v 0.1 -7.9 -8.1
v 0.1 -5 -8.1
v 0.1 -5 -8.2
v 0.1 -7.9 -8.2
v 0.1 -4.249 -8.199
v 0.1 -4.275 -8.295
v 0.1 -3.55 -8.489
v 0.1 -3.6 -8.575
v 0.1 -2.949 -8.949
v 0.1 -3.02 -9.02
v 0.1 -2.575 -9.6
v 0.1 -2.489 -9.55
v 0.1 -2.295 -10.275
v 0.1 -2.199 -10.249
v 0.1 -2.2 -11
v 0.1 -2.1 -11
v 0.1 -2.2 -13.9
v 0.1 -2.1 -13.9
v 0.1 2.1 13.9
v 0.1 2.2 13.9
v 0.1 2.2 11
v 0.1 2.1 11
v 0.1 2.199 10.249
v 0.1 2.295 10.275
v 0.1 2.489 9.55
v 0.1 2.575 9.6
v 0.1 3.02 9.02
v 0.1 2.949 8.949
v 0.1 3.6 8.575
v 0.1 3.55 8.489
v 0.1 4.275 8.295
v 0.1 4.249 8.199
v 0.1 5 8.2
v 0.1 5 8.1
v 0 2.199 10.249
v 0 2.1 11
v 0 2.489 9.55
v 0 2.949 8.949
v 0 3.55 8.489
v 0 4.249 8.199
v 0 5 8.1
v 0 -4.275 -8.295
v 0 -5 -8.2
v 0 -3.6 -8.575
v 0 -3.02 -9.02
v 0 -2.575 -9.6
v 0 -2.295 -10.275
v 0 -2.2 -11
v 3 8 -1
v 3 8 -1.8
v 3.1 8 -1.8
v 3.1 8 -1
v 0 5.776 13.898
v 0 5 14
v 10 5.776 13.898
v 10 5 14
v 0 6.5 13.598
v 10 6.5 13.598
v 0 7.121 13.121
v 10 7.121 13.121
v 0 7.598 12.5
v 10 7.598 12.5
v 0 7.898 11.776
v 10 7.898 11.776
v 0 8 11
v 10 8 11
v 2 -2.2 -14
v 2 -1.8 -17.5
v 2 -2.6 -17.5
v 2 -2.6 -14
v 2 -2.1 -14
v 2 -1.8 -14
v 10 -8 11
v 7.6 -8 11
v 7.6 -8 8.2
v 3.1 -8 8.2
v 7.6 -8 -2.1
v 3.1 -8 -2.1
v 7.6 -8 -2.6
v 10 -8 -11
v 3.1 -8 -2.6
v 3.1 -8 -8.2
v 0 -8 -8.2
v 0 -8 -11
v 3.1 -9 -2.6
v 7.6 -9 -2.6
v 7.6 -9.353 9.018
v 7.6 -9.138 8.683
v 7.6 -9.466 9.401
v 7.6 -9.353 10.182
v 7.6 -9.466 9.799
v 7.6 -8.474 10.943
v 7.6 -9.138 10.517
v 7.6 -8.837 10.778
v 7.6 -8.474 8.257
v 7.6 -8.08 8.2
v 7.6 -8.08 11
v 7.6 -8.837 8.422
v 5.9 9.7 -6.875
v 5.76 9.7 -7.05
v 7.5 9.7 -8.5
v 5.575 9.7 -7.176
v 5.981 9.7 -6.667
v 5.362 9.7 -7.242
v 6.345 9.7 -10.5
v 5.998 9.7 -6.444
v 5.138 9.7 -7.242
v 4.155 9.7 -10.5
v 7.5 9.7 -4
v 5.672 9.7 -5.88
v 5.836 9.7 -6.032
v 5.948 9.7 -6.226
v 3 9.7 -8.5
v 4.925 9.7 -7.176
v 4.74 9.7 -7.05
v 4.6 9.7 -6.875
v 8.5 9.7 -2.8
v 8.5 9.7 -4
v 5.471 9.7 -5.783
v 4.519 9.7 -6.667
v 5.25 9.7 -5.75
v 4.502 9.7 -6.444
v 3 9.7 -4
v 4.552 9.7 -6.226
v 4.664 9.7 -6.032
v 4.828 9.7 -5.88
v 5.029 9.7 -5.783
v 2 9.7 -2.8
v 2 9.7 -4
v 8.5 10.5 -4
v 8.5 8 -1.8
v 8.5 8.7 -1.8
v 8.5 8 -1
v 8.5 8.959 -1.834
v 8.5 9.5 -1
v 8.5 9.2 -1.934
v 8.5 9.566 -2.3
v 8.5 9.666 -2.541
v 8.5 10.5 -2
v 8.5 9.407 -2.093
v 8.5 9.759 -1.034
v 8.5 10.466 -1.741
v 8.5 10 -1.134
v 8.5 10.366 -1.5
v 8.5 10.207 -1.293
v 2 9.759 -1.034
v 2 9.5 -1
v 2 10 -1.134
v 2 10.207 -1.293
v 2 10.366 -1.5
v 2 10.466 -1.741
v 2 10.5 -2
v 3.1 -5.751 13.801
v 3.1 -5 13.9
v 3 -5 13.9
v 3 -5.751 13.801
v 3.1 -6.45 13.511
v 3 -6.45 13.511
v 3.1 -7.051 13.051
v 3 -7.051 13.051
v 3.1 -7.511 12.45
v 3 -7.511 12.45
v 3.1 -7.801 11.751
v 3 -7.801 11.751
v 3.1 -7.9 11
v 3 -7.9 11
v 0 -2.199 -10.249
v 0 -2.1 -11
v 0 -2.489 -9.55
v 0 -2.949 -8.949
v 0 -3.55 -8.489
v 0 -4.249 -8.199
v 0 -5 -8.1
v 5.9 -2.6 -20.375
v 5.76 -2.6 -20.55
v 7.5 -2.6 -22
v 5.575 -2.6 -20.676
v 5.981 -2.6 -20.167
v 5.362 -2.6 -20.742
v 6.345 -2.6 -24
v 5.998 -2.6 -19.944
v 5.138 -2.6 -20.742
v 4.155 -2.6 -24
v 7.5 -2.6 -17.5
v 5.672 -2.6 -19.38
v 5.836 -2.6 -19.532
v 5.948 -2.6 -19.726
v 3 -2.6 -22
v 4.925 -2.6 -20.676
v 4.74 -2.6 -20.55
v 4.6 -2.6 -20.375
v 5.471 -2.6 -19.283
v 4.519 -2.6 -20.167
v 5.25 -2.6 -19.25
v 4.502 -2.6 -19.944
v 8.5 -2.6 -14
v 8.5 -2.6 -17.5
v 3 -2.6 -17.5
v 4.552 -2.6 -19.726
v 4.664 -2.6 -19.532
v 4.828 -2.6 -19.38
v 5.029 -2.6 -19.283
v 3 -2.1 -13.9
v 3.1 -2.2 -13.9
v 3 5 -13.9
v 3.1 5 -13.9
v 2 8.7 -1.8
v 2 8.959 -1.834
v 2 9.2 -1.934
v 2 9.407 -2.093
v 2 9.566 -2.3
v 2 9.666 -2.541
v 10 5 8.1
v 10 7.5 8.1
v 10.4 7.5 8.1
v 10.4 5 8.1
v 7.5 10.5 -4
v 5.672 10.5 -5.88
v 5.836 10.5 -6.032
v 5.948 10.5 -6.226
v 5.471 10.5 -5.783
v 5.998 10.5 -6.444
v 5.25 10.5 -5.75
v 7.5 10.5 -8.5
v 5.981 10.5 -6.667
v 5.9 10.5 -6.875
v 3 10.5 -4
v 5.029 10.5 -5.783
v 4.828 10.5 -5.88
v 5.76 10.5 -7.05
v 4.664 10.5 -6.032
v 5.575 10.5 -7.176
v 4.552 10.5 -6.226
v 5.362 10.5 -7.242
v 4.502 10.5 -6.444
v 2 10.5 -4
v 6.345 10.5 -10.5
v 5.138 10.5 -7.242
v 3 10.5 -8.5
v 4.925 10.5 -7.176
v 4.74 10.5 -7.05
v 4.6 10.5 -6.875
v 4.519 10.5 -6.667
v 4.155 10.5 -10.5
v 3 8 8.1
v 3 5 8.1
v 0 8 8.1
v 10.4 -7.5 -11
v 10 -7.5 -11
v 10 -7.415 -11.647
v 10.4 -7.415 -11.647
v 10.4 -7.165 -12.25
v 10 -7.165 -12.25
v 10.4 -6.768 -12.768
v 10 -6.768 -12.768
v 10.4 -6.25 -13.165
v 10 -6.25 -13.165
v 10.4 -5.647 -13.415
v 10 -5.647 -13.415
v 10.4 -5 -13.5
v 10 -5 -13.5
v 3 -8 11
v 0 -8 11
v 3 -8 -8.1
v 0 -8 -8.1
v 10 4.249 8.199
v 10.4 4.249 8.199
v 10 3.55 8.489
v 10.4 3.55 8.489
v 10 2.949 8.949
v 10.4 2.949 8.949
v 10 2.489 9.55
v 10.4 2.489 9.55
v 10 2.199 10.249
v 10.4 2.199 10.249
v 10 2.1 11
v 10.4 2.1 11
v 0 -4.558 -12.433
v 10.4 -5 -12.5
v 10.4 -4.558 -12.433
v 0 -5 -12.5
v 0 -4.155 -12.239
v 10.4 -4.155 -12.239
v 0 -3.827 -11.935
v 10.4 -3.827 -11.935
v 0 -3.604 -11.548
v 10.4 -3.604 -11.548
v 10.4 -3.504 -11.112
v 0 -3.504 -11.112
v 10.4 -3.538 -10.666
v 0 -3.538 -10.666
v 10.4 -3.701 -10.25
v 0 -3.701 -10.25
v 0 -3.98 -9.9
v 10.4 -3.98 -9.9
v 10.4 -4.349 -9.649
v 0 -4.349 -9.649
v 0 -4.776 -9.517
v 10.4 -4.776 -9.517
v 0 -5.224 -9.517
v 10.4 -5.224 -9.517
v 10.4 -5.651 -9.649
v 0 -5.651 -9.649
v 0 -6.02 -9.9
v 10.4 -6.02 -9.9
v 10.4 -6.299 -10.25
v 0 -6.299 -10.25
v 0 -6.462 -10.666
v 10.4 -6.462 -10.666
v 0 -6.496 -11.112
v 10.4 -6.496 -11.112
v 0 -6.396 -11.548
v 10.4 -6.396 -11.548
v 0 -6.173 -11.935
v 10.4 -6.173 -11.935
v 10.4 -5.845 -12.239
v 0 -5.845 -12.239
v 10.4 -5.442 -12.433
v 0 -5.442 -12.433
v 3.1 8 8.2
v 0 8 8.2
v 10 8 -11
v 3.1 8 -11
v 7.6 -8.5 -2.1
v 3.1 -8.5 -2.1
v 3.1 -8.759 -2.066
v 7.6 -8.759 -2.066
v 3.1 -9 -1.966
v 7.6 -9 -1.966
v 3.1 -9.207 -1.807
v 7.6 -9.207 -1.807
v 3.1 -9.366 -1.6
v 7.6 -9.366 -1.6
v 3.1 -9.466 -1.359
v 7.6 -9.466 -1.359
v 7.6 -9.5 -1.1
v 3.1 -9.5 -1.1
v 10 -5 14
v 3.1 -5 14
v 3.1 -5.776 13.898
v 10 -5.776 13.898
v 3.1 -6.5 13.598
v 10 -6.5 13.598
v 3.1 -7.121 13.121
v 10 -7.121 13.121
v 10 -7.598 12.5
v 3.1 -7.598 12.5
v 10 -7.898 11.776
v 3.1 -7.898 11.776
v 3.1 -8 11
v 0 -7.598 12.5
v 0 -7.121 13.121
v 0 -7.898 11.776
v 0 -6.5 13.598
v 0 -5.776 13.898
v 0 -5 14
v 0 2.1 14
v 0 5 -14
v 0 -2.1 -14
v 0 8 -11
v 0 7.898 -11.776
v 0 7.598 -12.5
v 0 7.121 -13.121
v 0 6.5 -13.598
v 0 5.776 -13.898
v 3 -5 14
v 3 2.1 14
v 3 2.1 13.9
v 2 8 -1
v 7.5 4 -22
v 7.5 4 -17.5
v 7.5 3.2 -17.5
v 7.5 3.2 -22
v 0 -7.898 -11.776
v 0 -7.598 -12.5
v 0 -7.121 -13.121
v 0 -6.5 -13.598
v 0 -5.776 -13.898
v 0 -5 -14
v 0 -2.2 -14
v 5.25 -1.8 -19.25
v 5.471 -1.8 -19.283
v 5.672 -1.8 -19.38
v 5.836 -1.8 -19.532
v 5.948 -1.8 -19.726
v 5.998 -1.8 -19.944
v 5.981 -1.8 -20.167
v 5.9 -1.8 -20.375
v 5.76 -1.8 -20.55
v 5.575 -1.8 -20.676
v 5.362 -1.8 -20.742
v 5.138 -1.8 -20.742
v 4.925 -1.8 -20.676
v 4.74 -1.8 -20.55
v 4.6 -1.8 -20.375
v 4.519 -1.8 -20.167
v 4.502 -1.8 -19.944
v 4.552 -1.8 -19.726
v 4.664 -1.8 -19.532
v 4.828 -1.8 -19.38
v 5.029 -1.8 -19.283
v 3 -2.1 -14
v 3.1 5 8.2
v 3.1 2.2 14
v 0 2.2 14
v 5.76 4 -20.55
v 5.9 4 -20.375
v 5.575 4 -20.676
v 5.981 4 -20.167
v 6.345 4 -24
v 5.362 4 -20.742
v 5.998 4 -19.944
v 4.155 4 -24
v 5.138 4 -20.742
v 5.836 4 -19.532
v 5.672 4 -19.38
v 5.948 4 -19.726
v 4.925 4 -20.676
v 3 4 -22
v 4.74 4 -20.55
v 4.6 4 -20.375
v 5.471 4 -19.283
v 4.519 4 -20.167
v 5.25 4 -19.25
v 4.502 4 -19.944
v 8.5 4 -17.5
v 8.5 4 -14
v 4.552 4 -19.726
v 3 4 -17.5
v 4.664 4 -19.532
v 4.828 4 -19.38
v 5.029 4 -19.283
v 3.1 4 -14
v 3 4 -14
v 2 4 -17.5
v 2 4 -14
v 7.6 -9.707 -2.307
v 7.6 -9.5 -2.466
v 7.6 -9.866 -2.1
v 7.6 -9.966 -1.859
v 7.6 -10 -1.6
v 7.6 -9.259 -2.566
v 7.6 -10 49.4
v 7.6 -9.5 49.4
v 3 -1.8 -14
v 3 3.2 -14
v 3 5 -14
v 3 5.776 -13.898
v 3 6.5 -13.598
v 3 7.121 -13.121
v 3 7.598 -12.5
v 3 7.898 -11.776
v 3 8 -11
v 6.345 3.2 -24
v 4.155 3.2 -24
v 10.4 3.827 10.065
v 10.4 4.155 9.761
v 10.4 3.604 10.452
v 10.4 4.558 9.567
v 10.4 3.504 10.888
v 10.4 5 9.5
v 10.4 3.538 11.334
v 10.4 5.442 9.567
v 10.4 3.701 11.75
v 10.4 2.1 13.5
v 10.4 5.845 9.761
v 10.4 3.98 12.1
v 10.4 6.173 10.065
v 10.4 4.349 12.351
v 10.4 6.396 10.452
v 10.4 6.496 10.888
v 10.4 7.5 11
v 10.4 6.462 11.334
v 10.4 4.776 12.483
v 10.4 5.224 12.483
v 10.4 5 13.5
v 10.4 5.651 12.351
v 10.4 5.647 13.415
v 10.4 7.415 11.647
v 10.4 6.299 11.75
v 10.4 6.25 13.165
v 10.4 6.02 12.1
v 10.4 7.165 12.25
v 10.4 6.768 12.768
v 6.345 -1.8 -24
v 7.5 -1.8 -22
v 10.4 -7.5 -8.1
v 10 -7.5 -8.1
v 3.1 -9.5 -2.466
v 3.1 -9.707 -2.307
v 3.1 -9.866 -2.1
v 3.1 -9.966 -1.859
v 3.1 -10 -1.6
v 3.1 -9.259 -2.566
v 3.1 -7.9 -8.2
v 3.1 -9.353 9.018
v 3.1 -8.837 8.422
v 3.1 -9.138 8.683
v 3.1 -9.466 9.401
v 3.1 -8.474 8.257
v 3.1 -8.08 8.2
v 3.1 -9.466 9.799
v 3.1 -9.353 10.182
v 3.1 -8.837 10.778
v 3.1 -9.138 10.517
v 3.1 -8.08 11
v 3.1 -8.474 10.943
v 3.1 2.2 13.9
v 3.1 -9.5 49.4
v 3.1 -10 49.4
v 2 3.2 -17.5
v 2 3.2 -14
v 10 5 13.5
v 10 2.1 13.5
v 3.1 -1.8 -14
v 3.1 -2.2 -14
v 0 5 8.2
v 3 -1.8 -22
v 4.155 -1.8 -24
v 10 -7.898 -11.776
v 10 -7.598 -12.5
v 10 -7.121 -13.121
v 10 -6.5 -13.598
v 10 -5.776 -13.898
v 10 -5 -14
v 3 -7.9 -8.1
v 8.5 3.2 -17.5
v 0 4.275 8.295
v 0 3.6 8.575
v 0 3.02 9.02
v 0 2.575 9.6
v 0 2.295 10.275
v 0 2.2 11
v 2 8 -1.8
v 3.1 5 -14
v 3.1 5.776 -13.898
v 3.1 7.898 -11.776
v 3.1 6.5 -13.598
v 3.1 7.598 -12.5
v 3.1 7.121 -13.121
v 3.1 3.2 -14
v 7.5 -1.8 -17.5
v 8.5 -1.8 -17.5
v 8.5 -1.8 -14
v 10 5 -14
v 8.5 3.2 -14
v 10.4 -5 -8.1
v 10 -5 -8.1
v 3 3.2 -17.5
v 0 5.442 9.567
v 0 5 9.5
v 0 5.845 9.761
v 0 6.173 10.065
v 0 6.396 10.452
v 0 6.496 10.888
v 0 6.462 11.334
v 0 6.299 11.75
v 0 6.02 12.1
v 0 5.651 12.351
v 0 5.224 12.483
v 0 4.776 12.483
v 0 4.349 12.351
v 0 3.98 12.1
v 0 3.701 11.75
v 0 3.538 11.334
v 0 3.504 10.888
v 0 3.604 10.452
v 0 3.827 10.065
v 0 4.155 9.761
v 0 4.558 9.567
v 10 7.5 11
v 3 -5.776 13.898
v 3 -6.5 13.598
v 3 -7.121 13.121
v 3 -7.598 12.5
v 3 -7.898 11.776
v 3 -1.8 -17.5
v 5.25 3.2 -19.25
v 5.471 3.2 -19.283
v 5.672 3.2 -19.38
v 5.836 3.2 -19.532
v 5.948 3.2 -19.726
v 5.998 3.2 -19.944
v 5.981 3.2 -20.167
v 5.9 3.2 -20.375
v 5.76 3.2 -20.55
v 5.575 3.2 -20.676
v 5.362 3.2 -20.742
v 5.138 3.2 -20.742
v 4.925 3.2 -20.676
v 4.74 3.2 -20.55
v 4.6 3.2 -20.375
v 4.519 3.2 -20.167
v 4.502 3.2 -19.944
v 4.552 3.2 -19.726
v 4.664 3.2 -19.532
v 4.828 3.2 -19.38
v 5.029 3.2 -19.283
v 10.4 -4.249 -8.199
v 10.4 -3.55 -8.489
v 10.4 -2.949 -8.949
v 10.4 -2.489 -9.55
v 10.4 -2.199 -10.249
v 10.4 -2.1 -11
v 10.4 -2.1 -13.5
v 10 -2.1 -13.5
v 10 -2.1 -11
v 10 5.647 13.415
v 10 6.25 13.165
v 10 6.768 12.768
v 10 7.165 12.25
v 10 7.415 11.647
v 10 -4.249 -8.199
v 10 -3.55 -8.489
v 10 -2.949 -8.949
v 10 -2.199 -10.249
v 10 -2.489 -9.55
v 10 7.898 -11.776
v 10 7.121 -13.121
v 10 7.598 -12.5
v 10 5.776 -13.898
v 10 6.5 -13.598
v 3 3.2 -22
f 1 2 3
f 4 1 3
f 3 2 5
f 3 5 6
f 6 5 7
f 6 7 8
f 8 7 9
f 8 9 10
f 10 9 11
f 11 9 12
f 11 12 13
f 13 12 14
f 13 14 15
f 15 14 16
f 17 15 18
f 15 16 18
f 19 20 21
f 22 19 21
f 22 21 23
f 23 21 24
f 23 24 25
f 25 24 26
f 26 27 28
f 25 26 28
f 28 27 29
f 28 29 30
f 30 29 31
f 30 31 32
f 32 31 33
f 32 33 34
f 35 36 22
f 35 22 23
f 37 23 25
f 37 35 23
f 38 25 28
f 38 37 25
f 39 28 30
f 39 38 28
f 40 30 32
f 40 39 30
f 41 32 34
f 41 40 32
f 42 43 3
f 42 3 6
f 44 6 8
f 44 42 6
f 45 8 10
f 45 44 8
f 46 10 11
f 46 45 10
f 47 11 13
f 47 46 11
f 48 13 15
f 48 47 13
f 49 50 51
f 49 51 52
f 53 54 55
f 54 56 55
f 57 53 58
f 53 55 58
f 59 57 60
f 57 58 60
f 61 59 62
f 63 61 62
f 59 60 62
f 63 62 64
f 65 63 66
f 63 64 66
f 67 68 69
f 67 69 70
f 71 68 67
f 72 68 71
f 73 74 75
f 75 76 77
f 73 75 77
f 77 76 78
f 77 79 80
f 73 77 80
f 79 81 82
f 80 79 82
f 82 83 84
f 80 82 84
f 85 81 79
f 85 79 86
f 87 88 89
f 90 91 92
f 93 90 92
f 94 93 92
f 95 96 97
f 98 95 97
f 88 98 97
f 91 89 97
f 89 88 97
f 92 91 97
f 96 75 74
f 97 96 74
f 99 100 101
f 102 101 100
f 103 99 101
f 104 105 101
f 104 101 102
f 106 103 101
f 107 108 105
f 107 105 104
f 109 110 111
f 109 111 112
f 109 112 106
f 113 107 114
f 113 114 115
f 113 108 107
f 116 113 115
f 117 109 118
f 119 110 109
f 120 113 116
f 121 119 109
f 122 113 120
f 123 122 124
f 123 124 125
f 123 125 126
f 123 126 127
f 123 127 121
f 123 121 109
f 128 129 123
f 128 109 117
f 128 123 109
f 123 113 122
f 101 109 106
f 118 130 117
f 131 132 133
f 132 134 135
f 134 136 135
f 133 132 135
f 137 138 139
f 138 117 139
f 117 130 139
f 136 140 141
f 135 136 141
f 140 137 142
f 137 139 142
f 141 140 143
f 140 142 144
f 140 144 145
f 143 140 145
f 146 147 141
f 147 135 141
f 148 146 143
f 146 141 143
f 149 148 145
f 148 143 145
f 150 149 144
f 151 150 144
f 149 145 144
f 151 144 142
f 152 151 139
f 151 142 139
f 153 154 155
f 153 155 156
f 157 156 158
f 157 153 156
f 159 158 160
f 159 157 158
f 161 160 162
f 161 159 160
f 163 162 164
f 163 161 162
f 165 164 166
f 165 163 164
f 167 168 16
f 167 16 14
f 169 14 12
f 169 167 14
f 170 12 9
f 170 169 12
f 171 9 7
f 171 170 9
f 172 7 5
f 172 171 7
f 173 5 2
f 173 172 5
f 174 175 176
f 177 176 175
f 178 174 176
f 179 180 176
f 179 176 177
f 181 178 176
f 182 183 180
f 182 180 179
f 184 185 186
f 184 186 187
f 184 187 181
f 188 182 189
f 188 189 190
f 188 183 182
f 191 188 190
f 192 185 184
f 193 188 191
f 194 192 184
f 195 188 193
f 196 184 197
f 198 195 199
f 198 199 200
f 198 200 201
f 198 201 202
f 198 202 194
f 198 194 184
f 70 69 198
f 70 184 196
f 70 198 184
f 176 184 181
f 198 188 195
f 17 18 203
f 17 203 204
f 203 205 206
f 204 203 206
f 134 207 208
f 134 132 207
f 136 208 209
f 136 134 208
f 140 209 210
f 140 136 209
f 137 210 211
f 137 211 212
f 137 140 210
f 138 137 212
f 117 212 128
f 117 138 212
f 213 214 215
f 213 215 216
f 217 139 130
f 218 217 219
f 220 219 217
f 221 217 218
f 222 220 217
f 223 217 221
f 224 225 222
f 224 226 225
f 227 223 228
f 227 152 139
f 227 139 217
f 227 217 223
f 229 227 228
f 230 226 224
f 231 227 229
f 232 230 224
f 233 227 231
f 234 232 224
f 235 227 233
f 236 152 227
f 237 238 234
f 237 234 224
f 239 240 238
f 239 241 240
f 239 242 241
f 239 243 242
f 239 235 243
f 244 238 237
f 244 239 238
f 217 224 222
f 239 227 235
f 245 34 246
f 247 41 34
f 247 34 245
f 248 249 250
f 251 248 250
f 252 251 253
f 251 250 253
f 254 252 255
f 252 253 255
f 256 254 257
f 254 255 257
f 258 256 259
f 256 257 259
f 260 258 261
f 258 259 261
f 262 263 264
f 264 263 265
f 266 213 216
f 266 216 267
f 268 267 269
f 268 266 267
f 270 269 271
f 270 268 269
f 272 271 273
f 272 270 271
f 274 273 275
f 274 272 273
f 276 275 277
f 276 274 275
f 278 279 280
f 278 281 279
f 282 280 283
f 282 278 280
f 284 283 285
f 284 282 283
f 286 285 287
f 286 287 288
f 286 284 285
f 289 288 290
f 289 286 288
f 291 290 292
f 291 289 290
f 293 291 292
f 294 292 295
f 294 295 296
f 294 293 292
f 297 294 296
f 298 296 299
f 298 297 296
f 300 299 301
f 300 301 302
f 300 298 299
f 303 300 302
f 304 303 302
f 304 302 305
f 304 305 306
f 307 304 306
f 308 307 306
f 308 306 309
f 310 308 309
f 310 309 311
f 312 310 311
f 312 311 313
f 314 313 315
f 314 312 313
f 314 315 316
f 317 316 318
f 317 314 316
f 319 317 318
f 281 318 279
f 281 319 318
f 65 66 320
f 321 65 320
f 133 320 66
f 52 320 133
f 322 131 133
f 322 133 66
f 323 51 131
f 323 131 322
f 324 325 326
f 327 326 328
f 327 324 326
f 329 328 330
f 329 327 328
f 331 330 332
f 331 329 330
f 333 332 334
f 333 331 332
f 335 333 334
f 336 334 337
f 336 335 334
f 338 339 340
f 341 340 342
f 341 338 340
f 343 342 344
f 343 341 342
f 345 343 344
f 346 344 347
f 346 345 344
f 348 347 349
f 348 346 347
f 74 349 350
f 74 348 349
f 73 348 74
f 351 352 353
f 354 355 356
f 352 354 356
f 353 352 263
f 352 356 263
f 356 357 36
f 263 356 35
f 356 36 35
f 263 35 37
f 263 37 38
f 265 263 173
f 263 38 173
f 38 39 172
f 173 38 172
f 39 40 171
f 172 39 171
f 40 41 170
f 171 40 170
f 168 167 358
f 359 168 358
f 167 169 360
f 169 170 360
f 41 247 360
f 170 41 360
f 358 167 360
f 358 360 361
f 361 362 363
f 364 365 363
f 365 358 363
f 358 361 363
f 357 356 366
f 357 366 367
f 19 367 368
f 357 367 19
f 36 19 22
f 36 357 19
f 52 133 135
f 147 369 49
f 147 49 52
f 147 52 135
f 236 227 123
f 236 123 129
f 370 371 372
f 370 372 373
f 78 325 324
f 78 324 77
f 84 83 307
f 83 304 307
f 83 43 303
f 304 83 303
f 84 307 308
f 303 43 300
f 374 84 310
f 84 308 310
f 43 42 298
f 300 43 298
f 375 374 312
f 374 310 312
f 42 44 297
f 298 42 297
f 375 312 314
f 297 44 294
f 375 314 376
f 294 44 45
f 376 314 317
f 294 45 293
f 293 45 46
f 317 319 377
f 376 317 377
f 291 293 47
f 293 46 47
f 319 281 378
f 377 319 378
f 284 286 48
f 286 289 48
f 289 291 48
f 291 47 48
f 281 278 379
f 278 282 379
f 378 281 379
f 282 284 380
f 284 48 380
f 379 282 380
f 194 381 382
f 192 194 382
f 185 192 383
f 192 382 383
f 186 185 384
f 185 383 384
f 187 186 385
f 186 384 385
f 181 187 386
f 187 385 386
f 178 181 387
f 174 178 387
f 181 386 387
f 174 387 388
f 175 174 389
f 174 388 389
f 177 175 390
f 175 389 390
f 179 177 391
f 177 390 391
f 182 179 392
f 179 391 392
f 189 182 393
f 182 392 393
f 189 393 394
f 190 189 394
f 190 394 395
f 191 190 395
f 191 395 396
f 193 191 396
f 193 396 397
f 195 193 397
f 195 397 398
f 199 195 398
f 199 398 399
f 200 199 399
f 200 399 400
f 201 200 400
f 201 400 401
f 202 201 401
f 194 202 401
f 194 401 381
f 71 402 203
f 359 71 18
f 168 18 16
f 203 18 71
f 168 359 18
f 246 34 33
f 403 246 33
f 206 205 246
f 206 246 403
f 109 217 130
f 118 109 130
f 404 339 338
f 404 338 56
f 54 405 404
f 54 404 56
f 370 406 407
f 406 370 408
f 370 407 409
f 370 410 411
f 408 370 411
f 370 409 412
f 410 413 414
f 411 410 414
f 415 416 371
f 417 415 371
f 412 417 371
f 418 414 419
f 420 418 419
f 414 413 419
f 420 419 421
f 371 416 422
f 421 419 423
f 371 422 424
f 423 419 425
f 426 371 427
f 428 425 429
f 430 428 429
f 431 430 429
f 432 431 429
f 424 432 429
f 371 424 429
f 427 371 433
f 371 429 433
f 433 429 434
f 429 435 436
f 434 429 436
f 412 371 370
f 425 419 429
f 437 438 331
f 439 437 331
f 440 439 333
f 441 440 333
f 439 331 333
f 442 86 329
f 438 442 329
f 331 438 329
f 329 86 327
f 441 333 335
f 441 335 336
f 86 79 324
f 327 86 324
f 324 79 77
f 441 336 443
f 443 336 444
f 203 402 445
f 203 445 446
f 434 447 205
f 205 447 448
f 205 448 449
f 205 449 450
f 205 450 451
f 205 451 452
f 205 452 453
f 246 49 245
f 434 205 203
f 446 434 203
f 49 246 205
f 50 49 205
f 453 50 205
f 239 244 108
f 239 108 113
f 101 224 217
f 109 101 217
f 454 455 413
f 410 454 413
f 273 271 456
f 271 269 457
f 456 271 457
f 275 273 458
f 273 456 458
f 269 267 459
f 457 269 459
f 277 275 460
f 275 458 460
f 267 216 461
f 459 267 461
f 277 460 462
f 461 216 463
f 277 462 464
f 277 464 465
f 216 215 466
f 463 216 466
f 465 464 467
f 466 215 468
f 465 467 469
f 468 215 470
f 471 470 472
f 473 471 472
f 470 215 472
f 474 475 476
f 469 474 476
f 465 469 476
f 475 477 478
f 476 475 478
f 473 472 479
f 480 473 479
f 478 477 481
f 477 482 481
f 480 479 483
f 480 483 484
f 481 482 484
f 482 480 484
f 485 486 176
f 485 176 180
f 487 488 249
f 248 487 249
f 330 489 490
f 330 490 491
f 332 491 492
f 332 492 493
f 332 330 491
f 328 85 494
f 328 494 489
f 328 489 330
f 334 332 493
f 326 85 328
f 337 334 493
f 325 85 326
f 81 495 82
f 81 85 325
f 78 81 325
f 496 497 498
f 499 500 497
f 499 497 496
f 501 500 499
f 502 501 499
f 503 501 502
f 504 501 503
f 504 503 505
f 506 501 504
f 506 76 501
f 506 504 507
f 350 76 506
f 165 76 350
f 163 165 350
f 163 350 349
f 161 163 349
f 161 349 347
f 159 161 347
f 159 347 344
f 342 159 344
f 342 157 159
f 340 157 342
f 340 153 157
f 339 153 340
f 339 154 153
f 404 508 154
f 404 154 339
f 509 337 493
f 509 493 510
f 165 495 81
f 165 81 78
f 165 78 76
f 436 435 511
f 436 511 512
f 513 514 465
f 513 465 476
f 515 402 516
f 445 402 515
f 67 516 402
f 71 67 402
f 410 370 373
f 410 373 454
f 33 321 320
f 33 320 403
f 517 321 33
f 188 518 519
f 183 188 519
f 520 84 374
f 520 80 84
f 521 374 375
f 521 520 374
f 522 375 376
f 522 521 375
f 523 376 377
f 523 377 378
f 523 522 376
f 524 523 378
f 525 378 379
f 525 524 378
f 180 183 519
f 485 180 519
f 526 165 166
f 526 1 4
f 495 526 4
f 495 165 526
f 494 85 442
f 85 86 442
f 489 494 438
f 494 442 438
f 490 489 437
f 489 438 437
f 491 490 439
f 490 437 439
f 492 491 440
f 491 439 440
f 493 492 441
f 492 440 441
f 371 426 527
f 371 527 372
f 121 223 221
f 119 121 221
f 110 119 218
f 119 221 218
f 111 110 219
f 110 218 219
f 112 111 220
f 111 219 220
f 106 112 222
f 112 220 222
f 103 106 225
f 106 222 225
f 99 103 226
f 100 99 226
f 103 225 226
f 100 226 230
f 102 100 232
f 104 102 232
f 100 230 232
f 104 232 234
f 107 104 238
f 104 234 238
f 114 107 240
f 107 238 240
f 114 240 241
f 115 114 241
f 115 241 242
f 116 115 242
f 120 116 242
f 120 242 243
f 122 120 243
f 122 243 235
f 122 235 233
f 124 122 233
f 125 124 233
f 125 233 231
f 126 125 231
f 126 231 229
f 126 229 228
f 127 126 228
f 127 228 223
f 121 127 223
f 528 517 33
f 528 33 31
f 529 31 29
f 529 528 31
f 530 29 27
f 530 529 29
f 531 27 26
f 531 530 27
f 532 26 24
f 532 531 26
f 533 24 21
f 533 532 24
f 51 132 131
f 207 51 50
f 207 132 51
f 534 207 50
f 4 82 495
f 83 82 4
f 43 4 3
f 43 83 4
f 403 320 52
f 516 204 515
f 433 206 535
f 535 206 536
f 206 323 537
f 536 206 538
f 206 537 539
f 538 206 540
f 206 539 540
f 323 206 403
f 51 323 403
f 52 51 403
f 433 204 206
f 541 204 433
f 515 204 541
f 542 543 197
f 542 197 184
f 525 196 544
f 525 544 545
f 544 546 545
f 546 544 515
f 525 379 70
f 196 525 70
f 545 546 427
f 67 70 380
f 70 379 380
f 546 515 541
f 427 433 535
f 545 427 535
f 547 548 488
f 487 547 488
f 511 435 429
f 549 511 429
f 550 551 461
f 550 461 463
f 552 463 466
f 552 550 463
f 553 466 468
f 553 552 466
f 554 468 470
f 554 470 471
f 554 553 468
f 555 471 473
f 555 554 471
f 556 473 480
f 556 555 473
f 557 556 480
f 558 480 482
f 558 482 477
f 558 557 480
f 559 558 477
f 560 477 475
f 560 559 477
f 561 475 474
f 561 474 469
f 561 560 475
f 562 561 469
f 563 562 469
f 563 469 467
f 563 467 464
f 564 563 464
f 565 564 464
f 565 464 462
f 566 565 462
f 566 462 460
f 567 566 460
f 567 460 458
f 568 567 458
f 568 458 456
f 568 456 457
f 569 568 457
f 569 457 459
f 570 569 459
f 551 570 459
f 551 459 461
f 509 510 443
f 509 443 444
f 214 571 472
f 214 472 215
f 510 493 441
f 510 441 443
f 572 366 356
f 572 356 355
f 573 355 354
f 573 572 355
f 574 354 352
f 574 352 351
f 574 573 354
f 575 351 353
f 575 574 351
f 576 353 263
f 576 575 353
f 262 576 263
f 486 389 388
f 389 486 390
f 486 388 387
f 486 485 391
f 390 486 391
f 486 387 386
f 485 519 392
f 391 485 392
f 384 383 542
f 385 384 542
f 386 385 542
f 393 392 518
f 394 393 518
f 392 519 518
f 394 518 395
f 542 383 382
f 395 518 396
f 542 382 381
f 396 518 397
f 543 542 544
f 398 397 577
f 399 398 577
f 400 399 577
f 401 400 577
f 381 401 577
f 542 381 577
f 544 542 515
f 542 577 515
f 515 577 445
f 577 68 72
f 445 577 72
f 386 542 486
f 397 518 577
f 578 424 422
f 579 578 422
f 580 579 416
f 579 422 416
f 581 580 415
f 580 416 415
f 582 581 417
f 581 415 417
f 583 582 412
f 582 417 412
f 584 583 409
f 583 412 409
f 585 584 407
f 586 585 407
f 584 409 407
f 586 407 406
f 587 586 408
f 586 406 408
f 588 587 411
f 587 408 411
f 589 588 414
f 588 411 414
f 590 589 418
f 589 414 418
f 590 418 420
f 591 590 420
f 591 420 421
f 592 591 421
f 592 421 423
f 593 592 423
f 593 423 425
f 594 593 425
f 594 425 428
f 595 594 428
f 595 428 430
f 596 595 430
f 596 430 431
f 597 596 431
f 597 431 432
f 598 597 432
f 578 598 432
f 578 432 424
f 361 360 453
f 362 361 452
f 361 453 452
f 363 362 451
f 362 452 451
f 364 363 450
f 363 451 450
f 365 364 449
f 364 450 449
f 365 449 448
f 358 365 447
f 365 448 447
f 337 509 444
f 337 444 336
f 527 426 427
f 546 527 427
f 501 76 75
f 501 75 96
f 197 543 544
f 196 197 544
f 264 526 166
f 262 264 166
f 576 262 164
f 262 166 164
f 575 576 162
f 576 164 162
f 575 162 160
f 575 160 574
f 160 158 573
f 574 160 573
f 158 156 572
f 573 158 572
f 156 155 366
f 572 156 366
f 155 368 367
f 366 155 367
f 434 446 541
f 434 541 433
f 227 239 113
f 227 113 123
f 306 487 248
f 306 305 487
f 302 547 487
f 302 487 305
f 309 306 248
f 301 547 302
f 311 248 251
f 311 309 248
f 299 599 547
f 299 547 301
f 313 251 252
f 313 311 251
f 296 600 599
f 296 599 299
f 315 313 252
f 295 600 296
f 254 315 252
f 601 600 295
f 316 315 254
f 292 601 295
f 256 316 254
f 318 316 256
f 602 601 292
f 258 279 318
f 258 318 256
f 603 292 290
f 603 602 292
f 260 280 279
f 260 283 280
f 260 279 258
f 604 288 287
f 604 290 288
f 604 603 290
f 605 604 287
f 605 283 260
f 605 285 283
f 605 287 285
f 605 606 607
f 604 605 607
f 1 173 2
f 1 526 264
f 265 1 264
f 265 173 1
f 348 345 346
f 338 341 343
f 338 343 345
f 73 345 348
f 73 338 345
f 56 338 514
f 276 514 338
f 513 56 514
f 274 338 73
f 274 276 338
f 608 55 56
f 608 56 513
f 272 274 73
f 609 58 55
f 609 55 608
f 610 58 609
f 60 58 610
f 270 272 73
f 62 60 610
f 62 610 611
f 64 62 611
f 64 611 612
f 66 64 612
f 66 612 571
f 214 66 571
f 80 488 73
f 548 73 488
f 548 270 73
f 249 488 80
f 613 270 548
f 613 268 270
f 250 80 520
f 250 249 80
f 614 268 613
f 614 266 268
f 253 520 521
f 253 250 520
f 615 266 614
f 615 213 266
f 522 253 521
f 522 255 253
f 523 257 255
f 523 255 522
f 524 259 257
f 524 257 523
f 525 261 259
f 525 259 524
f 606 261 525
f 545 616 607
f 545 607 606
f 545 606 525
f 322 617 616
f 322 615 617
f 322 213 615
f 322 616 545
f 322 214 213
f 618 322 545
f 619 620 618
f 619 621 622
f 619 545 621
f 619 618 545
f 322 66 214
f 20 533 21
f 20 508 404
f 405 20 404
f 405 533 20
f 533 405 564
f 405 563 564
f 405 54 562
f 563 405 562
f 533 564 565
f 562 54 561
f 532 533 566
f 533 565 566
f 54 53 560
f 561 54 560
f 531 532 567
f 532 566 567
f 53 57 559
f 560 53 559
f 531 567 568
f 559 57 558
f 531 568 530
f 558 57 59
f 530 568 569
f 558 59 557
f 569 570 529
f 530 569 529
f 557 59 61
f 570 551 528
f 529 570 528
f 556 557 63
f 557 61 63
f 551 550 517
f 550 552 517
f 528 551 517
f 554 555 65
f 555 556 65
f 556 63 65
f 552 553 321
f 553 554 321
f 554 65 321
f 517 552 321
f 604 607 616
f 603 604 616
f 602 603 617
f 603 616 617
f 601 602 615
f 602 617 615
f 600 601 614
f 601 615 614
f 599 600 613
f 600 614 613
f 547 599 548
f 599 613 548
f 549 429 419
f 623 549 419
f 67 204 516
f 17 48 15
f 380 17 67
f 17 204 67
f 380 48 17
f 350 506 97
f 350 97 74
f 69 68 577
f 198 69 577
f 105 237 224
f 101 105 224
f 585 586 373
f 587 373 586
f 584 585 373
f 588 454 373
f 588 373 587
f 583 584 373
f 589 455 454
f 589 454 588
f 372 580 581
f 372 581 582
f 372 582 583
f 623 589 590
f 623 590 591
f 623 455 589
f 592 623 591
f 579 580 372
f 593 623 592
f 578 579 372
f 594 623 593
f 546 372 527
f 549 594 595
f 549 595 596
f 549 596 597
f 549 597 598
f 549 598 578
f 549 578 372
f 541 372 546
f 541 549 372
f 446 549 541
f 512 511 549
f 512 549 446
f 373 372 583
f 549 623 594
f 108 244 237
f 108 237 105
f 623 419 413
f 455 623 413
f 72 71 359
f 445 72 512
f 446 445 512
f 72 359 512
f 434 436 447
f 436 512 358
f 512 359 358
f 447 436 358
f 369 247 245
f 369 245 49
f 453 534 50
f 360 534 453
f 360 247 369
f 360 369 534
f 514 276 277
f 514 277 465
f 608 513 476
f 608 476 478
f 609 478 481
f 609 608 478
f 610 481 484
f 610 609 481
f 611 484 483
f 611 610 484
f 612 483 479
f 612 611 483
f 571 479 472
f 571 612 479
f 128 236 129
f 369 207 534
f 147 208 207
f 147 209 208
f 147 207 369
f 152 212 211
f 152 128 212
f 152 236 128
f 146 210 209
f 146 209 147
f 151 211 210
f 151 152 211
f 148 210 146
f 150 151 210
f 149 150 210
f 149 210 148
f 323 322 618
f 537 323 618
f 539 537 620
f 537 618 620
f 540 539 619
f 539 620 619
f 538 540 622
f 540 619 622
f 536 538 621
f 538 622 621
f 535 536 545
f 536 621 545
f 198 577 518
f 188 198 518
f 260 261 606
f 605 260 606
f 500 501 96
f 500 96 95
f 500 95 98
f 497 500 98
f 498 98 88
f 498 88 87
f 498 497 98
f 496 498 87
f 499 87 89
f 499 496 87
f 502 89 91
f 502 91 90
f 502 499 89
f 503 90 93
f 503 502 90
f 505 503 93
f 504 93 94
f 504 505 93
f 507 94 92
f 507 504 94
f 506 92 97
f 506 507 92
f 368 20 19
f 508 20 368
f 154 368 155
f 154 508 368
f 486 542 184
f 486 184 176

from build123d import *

# Parameters (mm, degrees)
SKETCH_1_W          = 28
SKETCH_1_H          = 16
SKETCH_1_R          = 1.5
EXTRUDE_1_DEPTH     = 10
FILLET_1_R          = 3
SKETCH_2_R          = 1.5
EXTRUDE_2_DEPTH     = 0.4
CUT_EXTRUDE_1_DEPTH = 0.1
CUT_EXTRUDE_2_DEPTH = 3
CUT_EXTRUDE_3_DEPTH = 0.1
CUT_EXTRUDE_4_DEPTH = 0.1
SKETCH_7_W          = 2.9
SKETCH_7_H          = 0.1
CUT_EXTRUDE_5_DEPTH = 0.1
SKETCH_8_W          = 2.9
SKETCH_8_H          = 0.1
CUT_EXTRUDE_6_DEPTH = 0.1
EXTRUDE_3_DEPTH     = 4.5
SKETCH_11_W         = 10
SKETCH_11_H         = 0.8
EXTRUDE_4_DEPTH     = 6.5
SKETCH_12_R         = 0.75
CUT_EXTRUDE_7_DEPTH = 53.388166603
FILLET_2_R          = 1
SKETCH_13_R         = 0.75
CUT_EXTRUDE_8_DEPTH = 2


with BuildPart() as part:
    # 草图1 → 凸台-拉伸1 (new body)
    with BuildSketch(Plane(origin=(0, 0, 0), x_dir=(0, 0, -1), z_dir=(1, 0, 0))):
        Rectangle(SKETCH_1_W, SKETCH_1_H)
        with Locations((11, -5)):
            Circle(SKETCH_1_R, mode=Mode.SUBTRACT)
        with Locations((-11, 5)):
            Circle(SKETCH_1_R, mode=Mode.SUBTRACT)
    extrude(amount=EXTRUDE_1_DEPTH)

    # 圆角1
    fillet_1_edges = [part.edges().sort_by_distance(p)[0] for p in [
        (5, 8, -14),
        (5, 8, 14),
        (5, -8, 14),
        (5, -8, -14),
    ]]
    fillet(fillet_1_edges, radius=FILLET_1_R)

    # 草图2 → 凸台-拉伸2 (add)
    # profile 1 of 2: a face of its own
    with BuildSketch(Plane(origin=(10, 0, 0), x_dir=(0, 0, -1), z_dir=(1, 0, 0))):
        with BuildLine():
            Line((13.5, -5), (13.5, -2.1))
            Line((13.5, -2.1), (11, -2.1))
            ThreePointArc((11, -2.1), (8.949390335, -2.949390335), (8.1, -5))
            Line((8.1, -5), (8.1, -7.5))
            Line((8.1, -7.5), (11, -7.5))
            ThreePointArc((11, -7.5), (12.767766953, -6.767766953), (13.5, -5))
        make_face()
        with Locations((11, -5)):
            Circle(SKETCH_2_R, mode=Mode.SUBTRACT)
    # profile 2 of 2: a face of its own
    with BuildSketch(Plane(origin=(10, 0, 0), x_dir=(0, 0, -1), z_dir=(1, 0, 0))):
        with BuildLine():
            Line((-11, 2.1), (-13.5, 2.1))
            Line((-13.5, 2.1), (-13.5, 5))
            ThreePointArc((-13.5, 5), (-12.767766953, 6.767766953), (-11, 7.5))
            Line((-11, 7.5), (-8.1, 7.5))
            Line((-8.1, 7.5), (-8.1, 5))
            ThreePointArc((-8.1, 5), (-8.949390335, 2.949390335), (-11, 2.1))
        make_face()
        with Locations((-11, 5)):
            Circle(SKETCH_2_R, mode=Mode.SUBTRACT)
    extrude(amount=EXTRUDE_2_DEPTH)

    # 草图3 → 切除-拉伸1 (cut)
    with BuildSketch(Plane.ZY):
        with BuildLine():
            Line((-13.5, -2.1), (-11, -2.1))
            ThreePointArc((-11, -2.1), (-8.949390335, -2.949390335), (-8.1, -5))
            Line((-8.1, -5), (-8.1, -7.5))
            Line((-8.1, -7.5), (-8.1, -8))
            Line((-8.1, -8), (-8.2, -8))
            Line((-8.2, -8), (-8.2, -7.5))
            Line((-8.2, -7.5), (-8.2, -5))
            ThreePointArc((-8.2, -5), (-9.020101013, -3.020101013), (-11, -2.2))
            Line((-11, -2.2), (-13.5, -2.2))
            Line((-13.5, -2.2), (-14, -2.2))
            Line((-14, -2.2), (-14, -2.1))
            Line((-14, -2.1), (-13.5, -2.1))
        make_face()
        with BuildLine():
            Line((13.5, 2.1), (11, 2.1))
            ThreePointArc((11, 2.1), (8.949390335, 2.949390335), (8.1, 5))
            Line((8.1, 5), (8.1, 7.5))
            Line((8.1, 7.5), (8.1, 8))
            Line((8.1, 8), (8.2, 8))
            Line((8.2, 8), (8.2, 7.5))
            Line((8.2, 7.5), (8.2, 5))
            ThreePointArc((8.2, 5), (9.020101013, 3.020101013), (11, 2.2))
            Line((11, 2.2), (13.5, 2.2))
            Line((13.5, 2.2), (14, 2.2))
            Line((14, 2.2), (14, 2.1))
            Line((14, 2.1), (13.5, 2.1))
        make_face()
    extrude(amount=-CUT_EXTRUDE_1_DEPTH, mode=Mode.SUBTRACT)

    # 草图4 → 切除-拉伸2 (cut)
    with BuildSketch(Plane(origin=(0, 8, 0), x_dir=(1, 0, 0), z_dir=(0, 1, 0))):
        Polygon((0, -8.2), (3.1, -8.2), (3.1, 14), (3, 14), (3, -8.1), (0, -8.1), align=None)
    extrude(amount=-CUT_EXTRUDE_2_DEPTH, mode=Mode.SUBTRACT)

    # 草图5 → 切除-拉伸3 (cut)
    with BuildSketch(Plane(origin=(0, 0, -14), x_dir=(-1, 0, 0), z_dir=(0, 0, -1))):
        Polygon((-3, 5), (-3, -2.1), (-0.1, -2.1), (-0.1, -2.2), (-3.1, -2.2), (-3.1, 5), align=None)
    extrude(amount=-CUT_EXTRUDE_3_DEPTH, mode=Mode.SUBTRACT)

    # 草图6 → 切除-拉伸4 (cut)
    with BuildSketch(Plane.ZY.offset(-3.1)):
        with BuildLine():
            Line((-8.2, -8), (11, -8))
            ThreePointArc((11, -8), (13.121320344, -7.121320344), (14, -5))
            Line((14, -5), (14, 2.1))
            Line((14, 2.1), (14, 2.2))
            Line((14, 2.2), (13.9, 2.2))
            Line((13.9, 2.2), (13.9, 2.1))
            Line((13.9, 2.1), (13.9, -5))
            ThreePointArc((13.9, -5), (13.050609665, -7.050609665), (11, -7.9))
            Line((11, -7.9), (-8.2, -7.9))
            Line((-8.2, -7.9), (-8.2, -8))
        make_face()
    extrude(amount=CUT_EXTRUDE_4_DEPTH, mode=Mode.SUBTRACT)

    # 草图7 → 切除-拉伸5 (cut)
    with BuildSketch(Plane.XY.offset(14)):
        with Locations((1.55, 2.15)):
            Rectangle(SKETCH_7_W, SKETCH_7_H)
    extrude(amount=-CUT_EXTRUDE_5_DEPTH, mode=Mode.SUBTRACT)

    # 草图8 → 切除-拉伸6 (cut)
    with BuildSketch(Plane.XZ.offset(8)):
        with Locations((1.55, -8.15)):
            Rectangle(SKETCH_8_W, SKETCH_8_H)
    extrude(amount=-CUT_EXTRUDE_6_DEPTH, mode=Mode.SUBTRACT)

    # 草图10 → 凸台-拉伸3 (add)
    with BuildSketch(Plane.ZY.offset(-3.1)):
        Polygon((-2.1, -8), (-2.6, -8), (-2.6, -10), (49.4, -10), (49.4, -9.5), (-2.1, -9.5), align=None)
        with BuildLine():
            Line((11, -8), (8.2, -8))
            Line((8.2, -8), (8.2, -8.08))
            ThreePointArc((8.2, -8.08), (9.371579858, -9.461240109), (10.925463198, -8.53071866))
            ThreePointArc((10.925463198, -8.53071866), (10.981240109, -8.308420142), (11, -8.08))
            Line((11, -8.08), (11, -8))
        make_face()
    extrude(amount=-EXTRUDE_3_DEPTH)

    # 草图11 → 凸台-拉伸4 (add)
    with BuildSketch(Plane.ZY.offset(-2)):
        with Locations((-19, 3.6)):
            Rectangle(SKETCH_11_W, SKETCH_11_H)
        with Locations((-19, -2.2)):
            Rectangle(SKETCH_11_W, SKETCH_11_H)
        Polygon((-1, 8), (-1, 10.5), (-10.5, 10.5), (-10.5, 9.7), (-1.8, 9.7), (-1.8, 8), align=None)
    extrude(amount=-EXTRUDE_4_DEPTH)

    # 草图12 → 切除-拉伸7 (cut, through all)
    with BuildSketch(Plane(origin=(0, 4, 0), x_dir=(1, 0, 0), z_dir=(0, 1, 0))):
        with Locations((5.25, 20)):
            Circle(SKETCH_12_R)
        Polygon((2, 17.5), (3, 17.5), (3, 22), (4.154700538, 24), (3, 24), (2, 24), align=None)
        Polygon((8.5, 24), (8.5, 17.5), (7.5, 17.5), (7.5, 22), (6.345299462, 24), (7.5, 24), align=None)
    extrude(amount=-CUT_EXTRUDE_7_DEPTH, mode=Mode.SUBTRACT)

    # 圆角2
    fillet_2_edges = [part.edges().sort_by_distance(p)[0] for p in [
        (5.35, -9.5, -2.1),
        (5.35, -10, -2.6),
        (5.25, 9.7, -1.8),
        (5.25, 10.5, -1),
    ]]
    fillet(fillet_2_edges, radius=FILLET_2_R)

    # 草图13 → 切除-拉伸8 (cut)
    with BuildSketch(Plane(origin=(0, 10.5, 0), x_dir=(1, 0, 0), z_dir=(0, 1, 0))):
        with Locations((5.25, 6.5)):
            Circle(SKETCH_13_R)
        Polygon((8.5, 10.5), (6.345299462, 10.5), (7.5, 8.5), (7.5, 4), (8.5, 4), align=None)
        Polygon((3, 4), (2, 4), (2, 10.5), (4.154700538, 10.5), (3, 8.5), align=None)
    extrude(amount=-CUT_EXTRUDE_8_DEPTH, mode=Mode.SUBTRACT)


solid = part.part
